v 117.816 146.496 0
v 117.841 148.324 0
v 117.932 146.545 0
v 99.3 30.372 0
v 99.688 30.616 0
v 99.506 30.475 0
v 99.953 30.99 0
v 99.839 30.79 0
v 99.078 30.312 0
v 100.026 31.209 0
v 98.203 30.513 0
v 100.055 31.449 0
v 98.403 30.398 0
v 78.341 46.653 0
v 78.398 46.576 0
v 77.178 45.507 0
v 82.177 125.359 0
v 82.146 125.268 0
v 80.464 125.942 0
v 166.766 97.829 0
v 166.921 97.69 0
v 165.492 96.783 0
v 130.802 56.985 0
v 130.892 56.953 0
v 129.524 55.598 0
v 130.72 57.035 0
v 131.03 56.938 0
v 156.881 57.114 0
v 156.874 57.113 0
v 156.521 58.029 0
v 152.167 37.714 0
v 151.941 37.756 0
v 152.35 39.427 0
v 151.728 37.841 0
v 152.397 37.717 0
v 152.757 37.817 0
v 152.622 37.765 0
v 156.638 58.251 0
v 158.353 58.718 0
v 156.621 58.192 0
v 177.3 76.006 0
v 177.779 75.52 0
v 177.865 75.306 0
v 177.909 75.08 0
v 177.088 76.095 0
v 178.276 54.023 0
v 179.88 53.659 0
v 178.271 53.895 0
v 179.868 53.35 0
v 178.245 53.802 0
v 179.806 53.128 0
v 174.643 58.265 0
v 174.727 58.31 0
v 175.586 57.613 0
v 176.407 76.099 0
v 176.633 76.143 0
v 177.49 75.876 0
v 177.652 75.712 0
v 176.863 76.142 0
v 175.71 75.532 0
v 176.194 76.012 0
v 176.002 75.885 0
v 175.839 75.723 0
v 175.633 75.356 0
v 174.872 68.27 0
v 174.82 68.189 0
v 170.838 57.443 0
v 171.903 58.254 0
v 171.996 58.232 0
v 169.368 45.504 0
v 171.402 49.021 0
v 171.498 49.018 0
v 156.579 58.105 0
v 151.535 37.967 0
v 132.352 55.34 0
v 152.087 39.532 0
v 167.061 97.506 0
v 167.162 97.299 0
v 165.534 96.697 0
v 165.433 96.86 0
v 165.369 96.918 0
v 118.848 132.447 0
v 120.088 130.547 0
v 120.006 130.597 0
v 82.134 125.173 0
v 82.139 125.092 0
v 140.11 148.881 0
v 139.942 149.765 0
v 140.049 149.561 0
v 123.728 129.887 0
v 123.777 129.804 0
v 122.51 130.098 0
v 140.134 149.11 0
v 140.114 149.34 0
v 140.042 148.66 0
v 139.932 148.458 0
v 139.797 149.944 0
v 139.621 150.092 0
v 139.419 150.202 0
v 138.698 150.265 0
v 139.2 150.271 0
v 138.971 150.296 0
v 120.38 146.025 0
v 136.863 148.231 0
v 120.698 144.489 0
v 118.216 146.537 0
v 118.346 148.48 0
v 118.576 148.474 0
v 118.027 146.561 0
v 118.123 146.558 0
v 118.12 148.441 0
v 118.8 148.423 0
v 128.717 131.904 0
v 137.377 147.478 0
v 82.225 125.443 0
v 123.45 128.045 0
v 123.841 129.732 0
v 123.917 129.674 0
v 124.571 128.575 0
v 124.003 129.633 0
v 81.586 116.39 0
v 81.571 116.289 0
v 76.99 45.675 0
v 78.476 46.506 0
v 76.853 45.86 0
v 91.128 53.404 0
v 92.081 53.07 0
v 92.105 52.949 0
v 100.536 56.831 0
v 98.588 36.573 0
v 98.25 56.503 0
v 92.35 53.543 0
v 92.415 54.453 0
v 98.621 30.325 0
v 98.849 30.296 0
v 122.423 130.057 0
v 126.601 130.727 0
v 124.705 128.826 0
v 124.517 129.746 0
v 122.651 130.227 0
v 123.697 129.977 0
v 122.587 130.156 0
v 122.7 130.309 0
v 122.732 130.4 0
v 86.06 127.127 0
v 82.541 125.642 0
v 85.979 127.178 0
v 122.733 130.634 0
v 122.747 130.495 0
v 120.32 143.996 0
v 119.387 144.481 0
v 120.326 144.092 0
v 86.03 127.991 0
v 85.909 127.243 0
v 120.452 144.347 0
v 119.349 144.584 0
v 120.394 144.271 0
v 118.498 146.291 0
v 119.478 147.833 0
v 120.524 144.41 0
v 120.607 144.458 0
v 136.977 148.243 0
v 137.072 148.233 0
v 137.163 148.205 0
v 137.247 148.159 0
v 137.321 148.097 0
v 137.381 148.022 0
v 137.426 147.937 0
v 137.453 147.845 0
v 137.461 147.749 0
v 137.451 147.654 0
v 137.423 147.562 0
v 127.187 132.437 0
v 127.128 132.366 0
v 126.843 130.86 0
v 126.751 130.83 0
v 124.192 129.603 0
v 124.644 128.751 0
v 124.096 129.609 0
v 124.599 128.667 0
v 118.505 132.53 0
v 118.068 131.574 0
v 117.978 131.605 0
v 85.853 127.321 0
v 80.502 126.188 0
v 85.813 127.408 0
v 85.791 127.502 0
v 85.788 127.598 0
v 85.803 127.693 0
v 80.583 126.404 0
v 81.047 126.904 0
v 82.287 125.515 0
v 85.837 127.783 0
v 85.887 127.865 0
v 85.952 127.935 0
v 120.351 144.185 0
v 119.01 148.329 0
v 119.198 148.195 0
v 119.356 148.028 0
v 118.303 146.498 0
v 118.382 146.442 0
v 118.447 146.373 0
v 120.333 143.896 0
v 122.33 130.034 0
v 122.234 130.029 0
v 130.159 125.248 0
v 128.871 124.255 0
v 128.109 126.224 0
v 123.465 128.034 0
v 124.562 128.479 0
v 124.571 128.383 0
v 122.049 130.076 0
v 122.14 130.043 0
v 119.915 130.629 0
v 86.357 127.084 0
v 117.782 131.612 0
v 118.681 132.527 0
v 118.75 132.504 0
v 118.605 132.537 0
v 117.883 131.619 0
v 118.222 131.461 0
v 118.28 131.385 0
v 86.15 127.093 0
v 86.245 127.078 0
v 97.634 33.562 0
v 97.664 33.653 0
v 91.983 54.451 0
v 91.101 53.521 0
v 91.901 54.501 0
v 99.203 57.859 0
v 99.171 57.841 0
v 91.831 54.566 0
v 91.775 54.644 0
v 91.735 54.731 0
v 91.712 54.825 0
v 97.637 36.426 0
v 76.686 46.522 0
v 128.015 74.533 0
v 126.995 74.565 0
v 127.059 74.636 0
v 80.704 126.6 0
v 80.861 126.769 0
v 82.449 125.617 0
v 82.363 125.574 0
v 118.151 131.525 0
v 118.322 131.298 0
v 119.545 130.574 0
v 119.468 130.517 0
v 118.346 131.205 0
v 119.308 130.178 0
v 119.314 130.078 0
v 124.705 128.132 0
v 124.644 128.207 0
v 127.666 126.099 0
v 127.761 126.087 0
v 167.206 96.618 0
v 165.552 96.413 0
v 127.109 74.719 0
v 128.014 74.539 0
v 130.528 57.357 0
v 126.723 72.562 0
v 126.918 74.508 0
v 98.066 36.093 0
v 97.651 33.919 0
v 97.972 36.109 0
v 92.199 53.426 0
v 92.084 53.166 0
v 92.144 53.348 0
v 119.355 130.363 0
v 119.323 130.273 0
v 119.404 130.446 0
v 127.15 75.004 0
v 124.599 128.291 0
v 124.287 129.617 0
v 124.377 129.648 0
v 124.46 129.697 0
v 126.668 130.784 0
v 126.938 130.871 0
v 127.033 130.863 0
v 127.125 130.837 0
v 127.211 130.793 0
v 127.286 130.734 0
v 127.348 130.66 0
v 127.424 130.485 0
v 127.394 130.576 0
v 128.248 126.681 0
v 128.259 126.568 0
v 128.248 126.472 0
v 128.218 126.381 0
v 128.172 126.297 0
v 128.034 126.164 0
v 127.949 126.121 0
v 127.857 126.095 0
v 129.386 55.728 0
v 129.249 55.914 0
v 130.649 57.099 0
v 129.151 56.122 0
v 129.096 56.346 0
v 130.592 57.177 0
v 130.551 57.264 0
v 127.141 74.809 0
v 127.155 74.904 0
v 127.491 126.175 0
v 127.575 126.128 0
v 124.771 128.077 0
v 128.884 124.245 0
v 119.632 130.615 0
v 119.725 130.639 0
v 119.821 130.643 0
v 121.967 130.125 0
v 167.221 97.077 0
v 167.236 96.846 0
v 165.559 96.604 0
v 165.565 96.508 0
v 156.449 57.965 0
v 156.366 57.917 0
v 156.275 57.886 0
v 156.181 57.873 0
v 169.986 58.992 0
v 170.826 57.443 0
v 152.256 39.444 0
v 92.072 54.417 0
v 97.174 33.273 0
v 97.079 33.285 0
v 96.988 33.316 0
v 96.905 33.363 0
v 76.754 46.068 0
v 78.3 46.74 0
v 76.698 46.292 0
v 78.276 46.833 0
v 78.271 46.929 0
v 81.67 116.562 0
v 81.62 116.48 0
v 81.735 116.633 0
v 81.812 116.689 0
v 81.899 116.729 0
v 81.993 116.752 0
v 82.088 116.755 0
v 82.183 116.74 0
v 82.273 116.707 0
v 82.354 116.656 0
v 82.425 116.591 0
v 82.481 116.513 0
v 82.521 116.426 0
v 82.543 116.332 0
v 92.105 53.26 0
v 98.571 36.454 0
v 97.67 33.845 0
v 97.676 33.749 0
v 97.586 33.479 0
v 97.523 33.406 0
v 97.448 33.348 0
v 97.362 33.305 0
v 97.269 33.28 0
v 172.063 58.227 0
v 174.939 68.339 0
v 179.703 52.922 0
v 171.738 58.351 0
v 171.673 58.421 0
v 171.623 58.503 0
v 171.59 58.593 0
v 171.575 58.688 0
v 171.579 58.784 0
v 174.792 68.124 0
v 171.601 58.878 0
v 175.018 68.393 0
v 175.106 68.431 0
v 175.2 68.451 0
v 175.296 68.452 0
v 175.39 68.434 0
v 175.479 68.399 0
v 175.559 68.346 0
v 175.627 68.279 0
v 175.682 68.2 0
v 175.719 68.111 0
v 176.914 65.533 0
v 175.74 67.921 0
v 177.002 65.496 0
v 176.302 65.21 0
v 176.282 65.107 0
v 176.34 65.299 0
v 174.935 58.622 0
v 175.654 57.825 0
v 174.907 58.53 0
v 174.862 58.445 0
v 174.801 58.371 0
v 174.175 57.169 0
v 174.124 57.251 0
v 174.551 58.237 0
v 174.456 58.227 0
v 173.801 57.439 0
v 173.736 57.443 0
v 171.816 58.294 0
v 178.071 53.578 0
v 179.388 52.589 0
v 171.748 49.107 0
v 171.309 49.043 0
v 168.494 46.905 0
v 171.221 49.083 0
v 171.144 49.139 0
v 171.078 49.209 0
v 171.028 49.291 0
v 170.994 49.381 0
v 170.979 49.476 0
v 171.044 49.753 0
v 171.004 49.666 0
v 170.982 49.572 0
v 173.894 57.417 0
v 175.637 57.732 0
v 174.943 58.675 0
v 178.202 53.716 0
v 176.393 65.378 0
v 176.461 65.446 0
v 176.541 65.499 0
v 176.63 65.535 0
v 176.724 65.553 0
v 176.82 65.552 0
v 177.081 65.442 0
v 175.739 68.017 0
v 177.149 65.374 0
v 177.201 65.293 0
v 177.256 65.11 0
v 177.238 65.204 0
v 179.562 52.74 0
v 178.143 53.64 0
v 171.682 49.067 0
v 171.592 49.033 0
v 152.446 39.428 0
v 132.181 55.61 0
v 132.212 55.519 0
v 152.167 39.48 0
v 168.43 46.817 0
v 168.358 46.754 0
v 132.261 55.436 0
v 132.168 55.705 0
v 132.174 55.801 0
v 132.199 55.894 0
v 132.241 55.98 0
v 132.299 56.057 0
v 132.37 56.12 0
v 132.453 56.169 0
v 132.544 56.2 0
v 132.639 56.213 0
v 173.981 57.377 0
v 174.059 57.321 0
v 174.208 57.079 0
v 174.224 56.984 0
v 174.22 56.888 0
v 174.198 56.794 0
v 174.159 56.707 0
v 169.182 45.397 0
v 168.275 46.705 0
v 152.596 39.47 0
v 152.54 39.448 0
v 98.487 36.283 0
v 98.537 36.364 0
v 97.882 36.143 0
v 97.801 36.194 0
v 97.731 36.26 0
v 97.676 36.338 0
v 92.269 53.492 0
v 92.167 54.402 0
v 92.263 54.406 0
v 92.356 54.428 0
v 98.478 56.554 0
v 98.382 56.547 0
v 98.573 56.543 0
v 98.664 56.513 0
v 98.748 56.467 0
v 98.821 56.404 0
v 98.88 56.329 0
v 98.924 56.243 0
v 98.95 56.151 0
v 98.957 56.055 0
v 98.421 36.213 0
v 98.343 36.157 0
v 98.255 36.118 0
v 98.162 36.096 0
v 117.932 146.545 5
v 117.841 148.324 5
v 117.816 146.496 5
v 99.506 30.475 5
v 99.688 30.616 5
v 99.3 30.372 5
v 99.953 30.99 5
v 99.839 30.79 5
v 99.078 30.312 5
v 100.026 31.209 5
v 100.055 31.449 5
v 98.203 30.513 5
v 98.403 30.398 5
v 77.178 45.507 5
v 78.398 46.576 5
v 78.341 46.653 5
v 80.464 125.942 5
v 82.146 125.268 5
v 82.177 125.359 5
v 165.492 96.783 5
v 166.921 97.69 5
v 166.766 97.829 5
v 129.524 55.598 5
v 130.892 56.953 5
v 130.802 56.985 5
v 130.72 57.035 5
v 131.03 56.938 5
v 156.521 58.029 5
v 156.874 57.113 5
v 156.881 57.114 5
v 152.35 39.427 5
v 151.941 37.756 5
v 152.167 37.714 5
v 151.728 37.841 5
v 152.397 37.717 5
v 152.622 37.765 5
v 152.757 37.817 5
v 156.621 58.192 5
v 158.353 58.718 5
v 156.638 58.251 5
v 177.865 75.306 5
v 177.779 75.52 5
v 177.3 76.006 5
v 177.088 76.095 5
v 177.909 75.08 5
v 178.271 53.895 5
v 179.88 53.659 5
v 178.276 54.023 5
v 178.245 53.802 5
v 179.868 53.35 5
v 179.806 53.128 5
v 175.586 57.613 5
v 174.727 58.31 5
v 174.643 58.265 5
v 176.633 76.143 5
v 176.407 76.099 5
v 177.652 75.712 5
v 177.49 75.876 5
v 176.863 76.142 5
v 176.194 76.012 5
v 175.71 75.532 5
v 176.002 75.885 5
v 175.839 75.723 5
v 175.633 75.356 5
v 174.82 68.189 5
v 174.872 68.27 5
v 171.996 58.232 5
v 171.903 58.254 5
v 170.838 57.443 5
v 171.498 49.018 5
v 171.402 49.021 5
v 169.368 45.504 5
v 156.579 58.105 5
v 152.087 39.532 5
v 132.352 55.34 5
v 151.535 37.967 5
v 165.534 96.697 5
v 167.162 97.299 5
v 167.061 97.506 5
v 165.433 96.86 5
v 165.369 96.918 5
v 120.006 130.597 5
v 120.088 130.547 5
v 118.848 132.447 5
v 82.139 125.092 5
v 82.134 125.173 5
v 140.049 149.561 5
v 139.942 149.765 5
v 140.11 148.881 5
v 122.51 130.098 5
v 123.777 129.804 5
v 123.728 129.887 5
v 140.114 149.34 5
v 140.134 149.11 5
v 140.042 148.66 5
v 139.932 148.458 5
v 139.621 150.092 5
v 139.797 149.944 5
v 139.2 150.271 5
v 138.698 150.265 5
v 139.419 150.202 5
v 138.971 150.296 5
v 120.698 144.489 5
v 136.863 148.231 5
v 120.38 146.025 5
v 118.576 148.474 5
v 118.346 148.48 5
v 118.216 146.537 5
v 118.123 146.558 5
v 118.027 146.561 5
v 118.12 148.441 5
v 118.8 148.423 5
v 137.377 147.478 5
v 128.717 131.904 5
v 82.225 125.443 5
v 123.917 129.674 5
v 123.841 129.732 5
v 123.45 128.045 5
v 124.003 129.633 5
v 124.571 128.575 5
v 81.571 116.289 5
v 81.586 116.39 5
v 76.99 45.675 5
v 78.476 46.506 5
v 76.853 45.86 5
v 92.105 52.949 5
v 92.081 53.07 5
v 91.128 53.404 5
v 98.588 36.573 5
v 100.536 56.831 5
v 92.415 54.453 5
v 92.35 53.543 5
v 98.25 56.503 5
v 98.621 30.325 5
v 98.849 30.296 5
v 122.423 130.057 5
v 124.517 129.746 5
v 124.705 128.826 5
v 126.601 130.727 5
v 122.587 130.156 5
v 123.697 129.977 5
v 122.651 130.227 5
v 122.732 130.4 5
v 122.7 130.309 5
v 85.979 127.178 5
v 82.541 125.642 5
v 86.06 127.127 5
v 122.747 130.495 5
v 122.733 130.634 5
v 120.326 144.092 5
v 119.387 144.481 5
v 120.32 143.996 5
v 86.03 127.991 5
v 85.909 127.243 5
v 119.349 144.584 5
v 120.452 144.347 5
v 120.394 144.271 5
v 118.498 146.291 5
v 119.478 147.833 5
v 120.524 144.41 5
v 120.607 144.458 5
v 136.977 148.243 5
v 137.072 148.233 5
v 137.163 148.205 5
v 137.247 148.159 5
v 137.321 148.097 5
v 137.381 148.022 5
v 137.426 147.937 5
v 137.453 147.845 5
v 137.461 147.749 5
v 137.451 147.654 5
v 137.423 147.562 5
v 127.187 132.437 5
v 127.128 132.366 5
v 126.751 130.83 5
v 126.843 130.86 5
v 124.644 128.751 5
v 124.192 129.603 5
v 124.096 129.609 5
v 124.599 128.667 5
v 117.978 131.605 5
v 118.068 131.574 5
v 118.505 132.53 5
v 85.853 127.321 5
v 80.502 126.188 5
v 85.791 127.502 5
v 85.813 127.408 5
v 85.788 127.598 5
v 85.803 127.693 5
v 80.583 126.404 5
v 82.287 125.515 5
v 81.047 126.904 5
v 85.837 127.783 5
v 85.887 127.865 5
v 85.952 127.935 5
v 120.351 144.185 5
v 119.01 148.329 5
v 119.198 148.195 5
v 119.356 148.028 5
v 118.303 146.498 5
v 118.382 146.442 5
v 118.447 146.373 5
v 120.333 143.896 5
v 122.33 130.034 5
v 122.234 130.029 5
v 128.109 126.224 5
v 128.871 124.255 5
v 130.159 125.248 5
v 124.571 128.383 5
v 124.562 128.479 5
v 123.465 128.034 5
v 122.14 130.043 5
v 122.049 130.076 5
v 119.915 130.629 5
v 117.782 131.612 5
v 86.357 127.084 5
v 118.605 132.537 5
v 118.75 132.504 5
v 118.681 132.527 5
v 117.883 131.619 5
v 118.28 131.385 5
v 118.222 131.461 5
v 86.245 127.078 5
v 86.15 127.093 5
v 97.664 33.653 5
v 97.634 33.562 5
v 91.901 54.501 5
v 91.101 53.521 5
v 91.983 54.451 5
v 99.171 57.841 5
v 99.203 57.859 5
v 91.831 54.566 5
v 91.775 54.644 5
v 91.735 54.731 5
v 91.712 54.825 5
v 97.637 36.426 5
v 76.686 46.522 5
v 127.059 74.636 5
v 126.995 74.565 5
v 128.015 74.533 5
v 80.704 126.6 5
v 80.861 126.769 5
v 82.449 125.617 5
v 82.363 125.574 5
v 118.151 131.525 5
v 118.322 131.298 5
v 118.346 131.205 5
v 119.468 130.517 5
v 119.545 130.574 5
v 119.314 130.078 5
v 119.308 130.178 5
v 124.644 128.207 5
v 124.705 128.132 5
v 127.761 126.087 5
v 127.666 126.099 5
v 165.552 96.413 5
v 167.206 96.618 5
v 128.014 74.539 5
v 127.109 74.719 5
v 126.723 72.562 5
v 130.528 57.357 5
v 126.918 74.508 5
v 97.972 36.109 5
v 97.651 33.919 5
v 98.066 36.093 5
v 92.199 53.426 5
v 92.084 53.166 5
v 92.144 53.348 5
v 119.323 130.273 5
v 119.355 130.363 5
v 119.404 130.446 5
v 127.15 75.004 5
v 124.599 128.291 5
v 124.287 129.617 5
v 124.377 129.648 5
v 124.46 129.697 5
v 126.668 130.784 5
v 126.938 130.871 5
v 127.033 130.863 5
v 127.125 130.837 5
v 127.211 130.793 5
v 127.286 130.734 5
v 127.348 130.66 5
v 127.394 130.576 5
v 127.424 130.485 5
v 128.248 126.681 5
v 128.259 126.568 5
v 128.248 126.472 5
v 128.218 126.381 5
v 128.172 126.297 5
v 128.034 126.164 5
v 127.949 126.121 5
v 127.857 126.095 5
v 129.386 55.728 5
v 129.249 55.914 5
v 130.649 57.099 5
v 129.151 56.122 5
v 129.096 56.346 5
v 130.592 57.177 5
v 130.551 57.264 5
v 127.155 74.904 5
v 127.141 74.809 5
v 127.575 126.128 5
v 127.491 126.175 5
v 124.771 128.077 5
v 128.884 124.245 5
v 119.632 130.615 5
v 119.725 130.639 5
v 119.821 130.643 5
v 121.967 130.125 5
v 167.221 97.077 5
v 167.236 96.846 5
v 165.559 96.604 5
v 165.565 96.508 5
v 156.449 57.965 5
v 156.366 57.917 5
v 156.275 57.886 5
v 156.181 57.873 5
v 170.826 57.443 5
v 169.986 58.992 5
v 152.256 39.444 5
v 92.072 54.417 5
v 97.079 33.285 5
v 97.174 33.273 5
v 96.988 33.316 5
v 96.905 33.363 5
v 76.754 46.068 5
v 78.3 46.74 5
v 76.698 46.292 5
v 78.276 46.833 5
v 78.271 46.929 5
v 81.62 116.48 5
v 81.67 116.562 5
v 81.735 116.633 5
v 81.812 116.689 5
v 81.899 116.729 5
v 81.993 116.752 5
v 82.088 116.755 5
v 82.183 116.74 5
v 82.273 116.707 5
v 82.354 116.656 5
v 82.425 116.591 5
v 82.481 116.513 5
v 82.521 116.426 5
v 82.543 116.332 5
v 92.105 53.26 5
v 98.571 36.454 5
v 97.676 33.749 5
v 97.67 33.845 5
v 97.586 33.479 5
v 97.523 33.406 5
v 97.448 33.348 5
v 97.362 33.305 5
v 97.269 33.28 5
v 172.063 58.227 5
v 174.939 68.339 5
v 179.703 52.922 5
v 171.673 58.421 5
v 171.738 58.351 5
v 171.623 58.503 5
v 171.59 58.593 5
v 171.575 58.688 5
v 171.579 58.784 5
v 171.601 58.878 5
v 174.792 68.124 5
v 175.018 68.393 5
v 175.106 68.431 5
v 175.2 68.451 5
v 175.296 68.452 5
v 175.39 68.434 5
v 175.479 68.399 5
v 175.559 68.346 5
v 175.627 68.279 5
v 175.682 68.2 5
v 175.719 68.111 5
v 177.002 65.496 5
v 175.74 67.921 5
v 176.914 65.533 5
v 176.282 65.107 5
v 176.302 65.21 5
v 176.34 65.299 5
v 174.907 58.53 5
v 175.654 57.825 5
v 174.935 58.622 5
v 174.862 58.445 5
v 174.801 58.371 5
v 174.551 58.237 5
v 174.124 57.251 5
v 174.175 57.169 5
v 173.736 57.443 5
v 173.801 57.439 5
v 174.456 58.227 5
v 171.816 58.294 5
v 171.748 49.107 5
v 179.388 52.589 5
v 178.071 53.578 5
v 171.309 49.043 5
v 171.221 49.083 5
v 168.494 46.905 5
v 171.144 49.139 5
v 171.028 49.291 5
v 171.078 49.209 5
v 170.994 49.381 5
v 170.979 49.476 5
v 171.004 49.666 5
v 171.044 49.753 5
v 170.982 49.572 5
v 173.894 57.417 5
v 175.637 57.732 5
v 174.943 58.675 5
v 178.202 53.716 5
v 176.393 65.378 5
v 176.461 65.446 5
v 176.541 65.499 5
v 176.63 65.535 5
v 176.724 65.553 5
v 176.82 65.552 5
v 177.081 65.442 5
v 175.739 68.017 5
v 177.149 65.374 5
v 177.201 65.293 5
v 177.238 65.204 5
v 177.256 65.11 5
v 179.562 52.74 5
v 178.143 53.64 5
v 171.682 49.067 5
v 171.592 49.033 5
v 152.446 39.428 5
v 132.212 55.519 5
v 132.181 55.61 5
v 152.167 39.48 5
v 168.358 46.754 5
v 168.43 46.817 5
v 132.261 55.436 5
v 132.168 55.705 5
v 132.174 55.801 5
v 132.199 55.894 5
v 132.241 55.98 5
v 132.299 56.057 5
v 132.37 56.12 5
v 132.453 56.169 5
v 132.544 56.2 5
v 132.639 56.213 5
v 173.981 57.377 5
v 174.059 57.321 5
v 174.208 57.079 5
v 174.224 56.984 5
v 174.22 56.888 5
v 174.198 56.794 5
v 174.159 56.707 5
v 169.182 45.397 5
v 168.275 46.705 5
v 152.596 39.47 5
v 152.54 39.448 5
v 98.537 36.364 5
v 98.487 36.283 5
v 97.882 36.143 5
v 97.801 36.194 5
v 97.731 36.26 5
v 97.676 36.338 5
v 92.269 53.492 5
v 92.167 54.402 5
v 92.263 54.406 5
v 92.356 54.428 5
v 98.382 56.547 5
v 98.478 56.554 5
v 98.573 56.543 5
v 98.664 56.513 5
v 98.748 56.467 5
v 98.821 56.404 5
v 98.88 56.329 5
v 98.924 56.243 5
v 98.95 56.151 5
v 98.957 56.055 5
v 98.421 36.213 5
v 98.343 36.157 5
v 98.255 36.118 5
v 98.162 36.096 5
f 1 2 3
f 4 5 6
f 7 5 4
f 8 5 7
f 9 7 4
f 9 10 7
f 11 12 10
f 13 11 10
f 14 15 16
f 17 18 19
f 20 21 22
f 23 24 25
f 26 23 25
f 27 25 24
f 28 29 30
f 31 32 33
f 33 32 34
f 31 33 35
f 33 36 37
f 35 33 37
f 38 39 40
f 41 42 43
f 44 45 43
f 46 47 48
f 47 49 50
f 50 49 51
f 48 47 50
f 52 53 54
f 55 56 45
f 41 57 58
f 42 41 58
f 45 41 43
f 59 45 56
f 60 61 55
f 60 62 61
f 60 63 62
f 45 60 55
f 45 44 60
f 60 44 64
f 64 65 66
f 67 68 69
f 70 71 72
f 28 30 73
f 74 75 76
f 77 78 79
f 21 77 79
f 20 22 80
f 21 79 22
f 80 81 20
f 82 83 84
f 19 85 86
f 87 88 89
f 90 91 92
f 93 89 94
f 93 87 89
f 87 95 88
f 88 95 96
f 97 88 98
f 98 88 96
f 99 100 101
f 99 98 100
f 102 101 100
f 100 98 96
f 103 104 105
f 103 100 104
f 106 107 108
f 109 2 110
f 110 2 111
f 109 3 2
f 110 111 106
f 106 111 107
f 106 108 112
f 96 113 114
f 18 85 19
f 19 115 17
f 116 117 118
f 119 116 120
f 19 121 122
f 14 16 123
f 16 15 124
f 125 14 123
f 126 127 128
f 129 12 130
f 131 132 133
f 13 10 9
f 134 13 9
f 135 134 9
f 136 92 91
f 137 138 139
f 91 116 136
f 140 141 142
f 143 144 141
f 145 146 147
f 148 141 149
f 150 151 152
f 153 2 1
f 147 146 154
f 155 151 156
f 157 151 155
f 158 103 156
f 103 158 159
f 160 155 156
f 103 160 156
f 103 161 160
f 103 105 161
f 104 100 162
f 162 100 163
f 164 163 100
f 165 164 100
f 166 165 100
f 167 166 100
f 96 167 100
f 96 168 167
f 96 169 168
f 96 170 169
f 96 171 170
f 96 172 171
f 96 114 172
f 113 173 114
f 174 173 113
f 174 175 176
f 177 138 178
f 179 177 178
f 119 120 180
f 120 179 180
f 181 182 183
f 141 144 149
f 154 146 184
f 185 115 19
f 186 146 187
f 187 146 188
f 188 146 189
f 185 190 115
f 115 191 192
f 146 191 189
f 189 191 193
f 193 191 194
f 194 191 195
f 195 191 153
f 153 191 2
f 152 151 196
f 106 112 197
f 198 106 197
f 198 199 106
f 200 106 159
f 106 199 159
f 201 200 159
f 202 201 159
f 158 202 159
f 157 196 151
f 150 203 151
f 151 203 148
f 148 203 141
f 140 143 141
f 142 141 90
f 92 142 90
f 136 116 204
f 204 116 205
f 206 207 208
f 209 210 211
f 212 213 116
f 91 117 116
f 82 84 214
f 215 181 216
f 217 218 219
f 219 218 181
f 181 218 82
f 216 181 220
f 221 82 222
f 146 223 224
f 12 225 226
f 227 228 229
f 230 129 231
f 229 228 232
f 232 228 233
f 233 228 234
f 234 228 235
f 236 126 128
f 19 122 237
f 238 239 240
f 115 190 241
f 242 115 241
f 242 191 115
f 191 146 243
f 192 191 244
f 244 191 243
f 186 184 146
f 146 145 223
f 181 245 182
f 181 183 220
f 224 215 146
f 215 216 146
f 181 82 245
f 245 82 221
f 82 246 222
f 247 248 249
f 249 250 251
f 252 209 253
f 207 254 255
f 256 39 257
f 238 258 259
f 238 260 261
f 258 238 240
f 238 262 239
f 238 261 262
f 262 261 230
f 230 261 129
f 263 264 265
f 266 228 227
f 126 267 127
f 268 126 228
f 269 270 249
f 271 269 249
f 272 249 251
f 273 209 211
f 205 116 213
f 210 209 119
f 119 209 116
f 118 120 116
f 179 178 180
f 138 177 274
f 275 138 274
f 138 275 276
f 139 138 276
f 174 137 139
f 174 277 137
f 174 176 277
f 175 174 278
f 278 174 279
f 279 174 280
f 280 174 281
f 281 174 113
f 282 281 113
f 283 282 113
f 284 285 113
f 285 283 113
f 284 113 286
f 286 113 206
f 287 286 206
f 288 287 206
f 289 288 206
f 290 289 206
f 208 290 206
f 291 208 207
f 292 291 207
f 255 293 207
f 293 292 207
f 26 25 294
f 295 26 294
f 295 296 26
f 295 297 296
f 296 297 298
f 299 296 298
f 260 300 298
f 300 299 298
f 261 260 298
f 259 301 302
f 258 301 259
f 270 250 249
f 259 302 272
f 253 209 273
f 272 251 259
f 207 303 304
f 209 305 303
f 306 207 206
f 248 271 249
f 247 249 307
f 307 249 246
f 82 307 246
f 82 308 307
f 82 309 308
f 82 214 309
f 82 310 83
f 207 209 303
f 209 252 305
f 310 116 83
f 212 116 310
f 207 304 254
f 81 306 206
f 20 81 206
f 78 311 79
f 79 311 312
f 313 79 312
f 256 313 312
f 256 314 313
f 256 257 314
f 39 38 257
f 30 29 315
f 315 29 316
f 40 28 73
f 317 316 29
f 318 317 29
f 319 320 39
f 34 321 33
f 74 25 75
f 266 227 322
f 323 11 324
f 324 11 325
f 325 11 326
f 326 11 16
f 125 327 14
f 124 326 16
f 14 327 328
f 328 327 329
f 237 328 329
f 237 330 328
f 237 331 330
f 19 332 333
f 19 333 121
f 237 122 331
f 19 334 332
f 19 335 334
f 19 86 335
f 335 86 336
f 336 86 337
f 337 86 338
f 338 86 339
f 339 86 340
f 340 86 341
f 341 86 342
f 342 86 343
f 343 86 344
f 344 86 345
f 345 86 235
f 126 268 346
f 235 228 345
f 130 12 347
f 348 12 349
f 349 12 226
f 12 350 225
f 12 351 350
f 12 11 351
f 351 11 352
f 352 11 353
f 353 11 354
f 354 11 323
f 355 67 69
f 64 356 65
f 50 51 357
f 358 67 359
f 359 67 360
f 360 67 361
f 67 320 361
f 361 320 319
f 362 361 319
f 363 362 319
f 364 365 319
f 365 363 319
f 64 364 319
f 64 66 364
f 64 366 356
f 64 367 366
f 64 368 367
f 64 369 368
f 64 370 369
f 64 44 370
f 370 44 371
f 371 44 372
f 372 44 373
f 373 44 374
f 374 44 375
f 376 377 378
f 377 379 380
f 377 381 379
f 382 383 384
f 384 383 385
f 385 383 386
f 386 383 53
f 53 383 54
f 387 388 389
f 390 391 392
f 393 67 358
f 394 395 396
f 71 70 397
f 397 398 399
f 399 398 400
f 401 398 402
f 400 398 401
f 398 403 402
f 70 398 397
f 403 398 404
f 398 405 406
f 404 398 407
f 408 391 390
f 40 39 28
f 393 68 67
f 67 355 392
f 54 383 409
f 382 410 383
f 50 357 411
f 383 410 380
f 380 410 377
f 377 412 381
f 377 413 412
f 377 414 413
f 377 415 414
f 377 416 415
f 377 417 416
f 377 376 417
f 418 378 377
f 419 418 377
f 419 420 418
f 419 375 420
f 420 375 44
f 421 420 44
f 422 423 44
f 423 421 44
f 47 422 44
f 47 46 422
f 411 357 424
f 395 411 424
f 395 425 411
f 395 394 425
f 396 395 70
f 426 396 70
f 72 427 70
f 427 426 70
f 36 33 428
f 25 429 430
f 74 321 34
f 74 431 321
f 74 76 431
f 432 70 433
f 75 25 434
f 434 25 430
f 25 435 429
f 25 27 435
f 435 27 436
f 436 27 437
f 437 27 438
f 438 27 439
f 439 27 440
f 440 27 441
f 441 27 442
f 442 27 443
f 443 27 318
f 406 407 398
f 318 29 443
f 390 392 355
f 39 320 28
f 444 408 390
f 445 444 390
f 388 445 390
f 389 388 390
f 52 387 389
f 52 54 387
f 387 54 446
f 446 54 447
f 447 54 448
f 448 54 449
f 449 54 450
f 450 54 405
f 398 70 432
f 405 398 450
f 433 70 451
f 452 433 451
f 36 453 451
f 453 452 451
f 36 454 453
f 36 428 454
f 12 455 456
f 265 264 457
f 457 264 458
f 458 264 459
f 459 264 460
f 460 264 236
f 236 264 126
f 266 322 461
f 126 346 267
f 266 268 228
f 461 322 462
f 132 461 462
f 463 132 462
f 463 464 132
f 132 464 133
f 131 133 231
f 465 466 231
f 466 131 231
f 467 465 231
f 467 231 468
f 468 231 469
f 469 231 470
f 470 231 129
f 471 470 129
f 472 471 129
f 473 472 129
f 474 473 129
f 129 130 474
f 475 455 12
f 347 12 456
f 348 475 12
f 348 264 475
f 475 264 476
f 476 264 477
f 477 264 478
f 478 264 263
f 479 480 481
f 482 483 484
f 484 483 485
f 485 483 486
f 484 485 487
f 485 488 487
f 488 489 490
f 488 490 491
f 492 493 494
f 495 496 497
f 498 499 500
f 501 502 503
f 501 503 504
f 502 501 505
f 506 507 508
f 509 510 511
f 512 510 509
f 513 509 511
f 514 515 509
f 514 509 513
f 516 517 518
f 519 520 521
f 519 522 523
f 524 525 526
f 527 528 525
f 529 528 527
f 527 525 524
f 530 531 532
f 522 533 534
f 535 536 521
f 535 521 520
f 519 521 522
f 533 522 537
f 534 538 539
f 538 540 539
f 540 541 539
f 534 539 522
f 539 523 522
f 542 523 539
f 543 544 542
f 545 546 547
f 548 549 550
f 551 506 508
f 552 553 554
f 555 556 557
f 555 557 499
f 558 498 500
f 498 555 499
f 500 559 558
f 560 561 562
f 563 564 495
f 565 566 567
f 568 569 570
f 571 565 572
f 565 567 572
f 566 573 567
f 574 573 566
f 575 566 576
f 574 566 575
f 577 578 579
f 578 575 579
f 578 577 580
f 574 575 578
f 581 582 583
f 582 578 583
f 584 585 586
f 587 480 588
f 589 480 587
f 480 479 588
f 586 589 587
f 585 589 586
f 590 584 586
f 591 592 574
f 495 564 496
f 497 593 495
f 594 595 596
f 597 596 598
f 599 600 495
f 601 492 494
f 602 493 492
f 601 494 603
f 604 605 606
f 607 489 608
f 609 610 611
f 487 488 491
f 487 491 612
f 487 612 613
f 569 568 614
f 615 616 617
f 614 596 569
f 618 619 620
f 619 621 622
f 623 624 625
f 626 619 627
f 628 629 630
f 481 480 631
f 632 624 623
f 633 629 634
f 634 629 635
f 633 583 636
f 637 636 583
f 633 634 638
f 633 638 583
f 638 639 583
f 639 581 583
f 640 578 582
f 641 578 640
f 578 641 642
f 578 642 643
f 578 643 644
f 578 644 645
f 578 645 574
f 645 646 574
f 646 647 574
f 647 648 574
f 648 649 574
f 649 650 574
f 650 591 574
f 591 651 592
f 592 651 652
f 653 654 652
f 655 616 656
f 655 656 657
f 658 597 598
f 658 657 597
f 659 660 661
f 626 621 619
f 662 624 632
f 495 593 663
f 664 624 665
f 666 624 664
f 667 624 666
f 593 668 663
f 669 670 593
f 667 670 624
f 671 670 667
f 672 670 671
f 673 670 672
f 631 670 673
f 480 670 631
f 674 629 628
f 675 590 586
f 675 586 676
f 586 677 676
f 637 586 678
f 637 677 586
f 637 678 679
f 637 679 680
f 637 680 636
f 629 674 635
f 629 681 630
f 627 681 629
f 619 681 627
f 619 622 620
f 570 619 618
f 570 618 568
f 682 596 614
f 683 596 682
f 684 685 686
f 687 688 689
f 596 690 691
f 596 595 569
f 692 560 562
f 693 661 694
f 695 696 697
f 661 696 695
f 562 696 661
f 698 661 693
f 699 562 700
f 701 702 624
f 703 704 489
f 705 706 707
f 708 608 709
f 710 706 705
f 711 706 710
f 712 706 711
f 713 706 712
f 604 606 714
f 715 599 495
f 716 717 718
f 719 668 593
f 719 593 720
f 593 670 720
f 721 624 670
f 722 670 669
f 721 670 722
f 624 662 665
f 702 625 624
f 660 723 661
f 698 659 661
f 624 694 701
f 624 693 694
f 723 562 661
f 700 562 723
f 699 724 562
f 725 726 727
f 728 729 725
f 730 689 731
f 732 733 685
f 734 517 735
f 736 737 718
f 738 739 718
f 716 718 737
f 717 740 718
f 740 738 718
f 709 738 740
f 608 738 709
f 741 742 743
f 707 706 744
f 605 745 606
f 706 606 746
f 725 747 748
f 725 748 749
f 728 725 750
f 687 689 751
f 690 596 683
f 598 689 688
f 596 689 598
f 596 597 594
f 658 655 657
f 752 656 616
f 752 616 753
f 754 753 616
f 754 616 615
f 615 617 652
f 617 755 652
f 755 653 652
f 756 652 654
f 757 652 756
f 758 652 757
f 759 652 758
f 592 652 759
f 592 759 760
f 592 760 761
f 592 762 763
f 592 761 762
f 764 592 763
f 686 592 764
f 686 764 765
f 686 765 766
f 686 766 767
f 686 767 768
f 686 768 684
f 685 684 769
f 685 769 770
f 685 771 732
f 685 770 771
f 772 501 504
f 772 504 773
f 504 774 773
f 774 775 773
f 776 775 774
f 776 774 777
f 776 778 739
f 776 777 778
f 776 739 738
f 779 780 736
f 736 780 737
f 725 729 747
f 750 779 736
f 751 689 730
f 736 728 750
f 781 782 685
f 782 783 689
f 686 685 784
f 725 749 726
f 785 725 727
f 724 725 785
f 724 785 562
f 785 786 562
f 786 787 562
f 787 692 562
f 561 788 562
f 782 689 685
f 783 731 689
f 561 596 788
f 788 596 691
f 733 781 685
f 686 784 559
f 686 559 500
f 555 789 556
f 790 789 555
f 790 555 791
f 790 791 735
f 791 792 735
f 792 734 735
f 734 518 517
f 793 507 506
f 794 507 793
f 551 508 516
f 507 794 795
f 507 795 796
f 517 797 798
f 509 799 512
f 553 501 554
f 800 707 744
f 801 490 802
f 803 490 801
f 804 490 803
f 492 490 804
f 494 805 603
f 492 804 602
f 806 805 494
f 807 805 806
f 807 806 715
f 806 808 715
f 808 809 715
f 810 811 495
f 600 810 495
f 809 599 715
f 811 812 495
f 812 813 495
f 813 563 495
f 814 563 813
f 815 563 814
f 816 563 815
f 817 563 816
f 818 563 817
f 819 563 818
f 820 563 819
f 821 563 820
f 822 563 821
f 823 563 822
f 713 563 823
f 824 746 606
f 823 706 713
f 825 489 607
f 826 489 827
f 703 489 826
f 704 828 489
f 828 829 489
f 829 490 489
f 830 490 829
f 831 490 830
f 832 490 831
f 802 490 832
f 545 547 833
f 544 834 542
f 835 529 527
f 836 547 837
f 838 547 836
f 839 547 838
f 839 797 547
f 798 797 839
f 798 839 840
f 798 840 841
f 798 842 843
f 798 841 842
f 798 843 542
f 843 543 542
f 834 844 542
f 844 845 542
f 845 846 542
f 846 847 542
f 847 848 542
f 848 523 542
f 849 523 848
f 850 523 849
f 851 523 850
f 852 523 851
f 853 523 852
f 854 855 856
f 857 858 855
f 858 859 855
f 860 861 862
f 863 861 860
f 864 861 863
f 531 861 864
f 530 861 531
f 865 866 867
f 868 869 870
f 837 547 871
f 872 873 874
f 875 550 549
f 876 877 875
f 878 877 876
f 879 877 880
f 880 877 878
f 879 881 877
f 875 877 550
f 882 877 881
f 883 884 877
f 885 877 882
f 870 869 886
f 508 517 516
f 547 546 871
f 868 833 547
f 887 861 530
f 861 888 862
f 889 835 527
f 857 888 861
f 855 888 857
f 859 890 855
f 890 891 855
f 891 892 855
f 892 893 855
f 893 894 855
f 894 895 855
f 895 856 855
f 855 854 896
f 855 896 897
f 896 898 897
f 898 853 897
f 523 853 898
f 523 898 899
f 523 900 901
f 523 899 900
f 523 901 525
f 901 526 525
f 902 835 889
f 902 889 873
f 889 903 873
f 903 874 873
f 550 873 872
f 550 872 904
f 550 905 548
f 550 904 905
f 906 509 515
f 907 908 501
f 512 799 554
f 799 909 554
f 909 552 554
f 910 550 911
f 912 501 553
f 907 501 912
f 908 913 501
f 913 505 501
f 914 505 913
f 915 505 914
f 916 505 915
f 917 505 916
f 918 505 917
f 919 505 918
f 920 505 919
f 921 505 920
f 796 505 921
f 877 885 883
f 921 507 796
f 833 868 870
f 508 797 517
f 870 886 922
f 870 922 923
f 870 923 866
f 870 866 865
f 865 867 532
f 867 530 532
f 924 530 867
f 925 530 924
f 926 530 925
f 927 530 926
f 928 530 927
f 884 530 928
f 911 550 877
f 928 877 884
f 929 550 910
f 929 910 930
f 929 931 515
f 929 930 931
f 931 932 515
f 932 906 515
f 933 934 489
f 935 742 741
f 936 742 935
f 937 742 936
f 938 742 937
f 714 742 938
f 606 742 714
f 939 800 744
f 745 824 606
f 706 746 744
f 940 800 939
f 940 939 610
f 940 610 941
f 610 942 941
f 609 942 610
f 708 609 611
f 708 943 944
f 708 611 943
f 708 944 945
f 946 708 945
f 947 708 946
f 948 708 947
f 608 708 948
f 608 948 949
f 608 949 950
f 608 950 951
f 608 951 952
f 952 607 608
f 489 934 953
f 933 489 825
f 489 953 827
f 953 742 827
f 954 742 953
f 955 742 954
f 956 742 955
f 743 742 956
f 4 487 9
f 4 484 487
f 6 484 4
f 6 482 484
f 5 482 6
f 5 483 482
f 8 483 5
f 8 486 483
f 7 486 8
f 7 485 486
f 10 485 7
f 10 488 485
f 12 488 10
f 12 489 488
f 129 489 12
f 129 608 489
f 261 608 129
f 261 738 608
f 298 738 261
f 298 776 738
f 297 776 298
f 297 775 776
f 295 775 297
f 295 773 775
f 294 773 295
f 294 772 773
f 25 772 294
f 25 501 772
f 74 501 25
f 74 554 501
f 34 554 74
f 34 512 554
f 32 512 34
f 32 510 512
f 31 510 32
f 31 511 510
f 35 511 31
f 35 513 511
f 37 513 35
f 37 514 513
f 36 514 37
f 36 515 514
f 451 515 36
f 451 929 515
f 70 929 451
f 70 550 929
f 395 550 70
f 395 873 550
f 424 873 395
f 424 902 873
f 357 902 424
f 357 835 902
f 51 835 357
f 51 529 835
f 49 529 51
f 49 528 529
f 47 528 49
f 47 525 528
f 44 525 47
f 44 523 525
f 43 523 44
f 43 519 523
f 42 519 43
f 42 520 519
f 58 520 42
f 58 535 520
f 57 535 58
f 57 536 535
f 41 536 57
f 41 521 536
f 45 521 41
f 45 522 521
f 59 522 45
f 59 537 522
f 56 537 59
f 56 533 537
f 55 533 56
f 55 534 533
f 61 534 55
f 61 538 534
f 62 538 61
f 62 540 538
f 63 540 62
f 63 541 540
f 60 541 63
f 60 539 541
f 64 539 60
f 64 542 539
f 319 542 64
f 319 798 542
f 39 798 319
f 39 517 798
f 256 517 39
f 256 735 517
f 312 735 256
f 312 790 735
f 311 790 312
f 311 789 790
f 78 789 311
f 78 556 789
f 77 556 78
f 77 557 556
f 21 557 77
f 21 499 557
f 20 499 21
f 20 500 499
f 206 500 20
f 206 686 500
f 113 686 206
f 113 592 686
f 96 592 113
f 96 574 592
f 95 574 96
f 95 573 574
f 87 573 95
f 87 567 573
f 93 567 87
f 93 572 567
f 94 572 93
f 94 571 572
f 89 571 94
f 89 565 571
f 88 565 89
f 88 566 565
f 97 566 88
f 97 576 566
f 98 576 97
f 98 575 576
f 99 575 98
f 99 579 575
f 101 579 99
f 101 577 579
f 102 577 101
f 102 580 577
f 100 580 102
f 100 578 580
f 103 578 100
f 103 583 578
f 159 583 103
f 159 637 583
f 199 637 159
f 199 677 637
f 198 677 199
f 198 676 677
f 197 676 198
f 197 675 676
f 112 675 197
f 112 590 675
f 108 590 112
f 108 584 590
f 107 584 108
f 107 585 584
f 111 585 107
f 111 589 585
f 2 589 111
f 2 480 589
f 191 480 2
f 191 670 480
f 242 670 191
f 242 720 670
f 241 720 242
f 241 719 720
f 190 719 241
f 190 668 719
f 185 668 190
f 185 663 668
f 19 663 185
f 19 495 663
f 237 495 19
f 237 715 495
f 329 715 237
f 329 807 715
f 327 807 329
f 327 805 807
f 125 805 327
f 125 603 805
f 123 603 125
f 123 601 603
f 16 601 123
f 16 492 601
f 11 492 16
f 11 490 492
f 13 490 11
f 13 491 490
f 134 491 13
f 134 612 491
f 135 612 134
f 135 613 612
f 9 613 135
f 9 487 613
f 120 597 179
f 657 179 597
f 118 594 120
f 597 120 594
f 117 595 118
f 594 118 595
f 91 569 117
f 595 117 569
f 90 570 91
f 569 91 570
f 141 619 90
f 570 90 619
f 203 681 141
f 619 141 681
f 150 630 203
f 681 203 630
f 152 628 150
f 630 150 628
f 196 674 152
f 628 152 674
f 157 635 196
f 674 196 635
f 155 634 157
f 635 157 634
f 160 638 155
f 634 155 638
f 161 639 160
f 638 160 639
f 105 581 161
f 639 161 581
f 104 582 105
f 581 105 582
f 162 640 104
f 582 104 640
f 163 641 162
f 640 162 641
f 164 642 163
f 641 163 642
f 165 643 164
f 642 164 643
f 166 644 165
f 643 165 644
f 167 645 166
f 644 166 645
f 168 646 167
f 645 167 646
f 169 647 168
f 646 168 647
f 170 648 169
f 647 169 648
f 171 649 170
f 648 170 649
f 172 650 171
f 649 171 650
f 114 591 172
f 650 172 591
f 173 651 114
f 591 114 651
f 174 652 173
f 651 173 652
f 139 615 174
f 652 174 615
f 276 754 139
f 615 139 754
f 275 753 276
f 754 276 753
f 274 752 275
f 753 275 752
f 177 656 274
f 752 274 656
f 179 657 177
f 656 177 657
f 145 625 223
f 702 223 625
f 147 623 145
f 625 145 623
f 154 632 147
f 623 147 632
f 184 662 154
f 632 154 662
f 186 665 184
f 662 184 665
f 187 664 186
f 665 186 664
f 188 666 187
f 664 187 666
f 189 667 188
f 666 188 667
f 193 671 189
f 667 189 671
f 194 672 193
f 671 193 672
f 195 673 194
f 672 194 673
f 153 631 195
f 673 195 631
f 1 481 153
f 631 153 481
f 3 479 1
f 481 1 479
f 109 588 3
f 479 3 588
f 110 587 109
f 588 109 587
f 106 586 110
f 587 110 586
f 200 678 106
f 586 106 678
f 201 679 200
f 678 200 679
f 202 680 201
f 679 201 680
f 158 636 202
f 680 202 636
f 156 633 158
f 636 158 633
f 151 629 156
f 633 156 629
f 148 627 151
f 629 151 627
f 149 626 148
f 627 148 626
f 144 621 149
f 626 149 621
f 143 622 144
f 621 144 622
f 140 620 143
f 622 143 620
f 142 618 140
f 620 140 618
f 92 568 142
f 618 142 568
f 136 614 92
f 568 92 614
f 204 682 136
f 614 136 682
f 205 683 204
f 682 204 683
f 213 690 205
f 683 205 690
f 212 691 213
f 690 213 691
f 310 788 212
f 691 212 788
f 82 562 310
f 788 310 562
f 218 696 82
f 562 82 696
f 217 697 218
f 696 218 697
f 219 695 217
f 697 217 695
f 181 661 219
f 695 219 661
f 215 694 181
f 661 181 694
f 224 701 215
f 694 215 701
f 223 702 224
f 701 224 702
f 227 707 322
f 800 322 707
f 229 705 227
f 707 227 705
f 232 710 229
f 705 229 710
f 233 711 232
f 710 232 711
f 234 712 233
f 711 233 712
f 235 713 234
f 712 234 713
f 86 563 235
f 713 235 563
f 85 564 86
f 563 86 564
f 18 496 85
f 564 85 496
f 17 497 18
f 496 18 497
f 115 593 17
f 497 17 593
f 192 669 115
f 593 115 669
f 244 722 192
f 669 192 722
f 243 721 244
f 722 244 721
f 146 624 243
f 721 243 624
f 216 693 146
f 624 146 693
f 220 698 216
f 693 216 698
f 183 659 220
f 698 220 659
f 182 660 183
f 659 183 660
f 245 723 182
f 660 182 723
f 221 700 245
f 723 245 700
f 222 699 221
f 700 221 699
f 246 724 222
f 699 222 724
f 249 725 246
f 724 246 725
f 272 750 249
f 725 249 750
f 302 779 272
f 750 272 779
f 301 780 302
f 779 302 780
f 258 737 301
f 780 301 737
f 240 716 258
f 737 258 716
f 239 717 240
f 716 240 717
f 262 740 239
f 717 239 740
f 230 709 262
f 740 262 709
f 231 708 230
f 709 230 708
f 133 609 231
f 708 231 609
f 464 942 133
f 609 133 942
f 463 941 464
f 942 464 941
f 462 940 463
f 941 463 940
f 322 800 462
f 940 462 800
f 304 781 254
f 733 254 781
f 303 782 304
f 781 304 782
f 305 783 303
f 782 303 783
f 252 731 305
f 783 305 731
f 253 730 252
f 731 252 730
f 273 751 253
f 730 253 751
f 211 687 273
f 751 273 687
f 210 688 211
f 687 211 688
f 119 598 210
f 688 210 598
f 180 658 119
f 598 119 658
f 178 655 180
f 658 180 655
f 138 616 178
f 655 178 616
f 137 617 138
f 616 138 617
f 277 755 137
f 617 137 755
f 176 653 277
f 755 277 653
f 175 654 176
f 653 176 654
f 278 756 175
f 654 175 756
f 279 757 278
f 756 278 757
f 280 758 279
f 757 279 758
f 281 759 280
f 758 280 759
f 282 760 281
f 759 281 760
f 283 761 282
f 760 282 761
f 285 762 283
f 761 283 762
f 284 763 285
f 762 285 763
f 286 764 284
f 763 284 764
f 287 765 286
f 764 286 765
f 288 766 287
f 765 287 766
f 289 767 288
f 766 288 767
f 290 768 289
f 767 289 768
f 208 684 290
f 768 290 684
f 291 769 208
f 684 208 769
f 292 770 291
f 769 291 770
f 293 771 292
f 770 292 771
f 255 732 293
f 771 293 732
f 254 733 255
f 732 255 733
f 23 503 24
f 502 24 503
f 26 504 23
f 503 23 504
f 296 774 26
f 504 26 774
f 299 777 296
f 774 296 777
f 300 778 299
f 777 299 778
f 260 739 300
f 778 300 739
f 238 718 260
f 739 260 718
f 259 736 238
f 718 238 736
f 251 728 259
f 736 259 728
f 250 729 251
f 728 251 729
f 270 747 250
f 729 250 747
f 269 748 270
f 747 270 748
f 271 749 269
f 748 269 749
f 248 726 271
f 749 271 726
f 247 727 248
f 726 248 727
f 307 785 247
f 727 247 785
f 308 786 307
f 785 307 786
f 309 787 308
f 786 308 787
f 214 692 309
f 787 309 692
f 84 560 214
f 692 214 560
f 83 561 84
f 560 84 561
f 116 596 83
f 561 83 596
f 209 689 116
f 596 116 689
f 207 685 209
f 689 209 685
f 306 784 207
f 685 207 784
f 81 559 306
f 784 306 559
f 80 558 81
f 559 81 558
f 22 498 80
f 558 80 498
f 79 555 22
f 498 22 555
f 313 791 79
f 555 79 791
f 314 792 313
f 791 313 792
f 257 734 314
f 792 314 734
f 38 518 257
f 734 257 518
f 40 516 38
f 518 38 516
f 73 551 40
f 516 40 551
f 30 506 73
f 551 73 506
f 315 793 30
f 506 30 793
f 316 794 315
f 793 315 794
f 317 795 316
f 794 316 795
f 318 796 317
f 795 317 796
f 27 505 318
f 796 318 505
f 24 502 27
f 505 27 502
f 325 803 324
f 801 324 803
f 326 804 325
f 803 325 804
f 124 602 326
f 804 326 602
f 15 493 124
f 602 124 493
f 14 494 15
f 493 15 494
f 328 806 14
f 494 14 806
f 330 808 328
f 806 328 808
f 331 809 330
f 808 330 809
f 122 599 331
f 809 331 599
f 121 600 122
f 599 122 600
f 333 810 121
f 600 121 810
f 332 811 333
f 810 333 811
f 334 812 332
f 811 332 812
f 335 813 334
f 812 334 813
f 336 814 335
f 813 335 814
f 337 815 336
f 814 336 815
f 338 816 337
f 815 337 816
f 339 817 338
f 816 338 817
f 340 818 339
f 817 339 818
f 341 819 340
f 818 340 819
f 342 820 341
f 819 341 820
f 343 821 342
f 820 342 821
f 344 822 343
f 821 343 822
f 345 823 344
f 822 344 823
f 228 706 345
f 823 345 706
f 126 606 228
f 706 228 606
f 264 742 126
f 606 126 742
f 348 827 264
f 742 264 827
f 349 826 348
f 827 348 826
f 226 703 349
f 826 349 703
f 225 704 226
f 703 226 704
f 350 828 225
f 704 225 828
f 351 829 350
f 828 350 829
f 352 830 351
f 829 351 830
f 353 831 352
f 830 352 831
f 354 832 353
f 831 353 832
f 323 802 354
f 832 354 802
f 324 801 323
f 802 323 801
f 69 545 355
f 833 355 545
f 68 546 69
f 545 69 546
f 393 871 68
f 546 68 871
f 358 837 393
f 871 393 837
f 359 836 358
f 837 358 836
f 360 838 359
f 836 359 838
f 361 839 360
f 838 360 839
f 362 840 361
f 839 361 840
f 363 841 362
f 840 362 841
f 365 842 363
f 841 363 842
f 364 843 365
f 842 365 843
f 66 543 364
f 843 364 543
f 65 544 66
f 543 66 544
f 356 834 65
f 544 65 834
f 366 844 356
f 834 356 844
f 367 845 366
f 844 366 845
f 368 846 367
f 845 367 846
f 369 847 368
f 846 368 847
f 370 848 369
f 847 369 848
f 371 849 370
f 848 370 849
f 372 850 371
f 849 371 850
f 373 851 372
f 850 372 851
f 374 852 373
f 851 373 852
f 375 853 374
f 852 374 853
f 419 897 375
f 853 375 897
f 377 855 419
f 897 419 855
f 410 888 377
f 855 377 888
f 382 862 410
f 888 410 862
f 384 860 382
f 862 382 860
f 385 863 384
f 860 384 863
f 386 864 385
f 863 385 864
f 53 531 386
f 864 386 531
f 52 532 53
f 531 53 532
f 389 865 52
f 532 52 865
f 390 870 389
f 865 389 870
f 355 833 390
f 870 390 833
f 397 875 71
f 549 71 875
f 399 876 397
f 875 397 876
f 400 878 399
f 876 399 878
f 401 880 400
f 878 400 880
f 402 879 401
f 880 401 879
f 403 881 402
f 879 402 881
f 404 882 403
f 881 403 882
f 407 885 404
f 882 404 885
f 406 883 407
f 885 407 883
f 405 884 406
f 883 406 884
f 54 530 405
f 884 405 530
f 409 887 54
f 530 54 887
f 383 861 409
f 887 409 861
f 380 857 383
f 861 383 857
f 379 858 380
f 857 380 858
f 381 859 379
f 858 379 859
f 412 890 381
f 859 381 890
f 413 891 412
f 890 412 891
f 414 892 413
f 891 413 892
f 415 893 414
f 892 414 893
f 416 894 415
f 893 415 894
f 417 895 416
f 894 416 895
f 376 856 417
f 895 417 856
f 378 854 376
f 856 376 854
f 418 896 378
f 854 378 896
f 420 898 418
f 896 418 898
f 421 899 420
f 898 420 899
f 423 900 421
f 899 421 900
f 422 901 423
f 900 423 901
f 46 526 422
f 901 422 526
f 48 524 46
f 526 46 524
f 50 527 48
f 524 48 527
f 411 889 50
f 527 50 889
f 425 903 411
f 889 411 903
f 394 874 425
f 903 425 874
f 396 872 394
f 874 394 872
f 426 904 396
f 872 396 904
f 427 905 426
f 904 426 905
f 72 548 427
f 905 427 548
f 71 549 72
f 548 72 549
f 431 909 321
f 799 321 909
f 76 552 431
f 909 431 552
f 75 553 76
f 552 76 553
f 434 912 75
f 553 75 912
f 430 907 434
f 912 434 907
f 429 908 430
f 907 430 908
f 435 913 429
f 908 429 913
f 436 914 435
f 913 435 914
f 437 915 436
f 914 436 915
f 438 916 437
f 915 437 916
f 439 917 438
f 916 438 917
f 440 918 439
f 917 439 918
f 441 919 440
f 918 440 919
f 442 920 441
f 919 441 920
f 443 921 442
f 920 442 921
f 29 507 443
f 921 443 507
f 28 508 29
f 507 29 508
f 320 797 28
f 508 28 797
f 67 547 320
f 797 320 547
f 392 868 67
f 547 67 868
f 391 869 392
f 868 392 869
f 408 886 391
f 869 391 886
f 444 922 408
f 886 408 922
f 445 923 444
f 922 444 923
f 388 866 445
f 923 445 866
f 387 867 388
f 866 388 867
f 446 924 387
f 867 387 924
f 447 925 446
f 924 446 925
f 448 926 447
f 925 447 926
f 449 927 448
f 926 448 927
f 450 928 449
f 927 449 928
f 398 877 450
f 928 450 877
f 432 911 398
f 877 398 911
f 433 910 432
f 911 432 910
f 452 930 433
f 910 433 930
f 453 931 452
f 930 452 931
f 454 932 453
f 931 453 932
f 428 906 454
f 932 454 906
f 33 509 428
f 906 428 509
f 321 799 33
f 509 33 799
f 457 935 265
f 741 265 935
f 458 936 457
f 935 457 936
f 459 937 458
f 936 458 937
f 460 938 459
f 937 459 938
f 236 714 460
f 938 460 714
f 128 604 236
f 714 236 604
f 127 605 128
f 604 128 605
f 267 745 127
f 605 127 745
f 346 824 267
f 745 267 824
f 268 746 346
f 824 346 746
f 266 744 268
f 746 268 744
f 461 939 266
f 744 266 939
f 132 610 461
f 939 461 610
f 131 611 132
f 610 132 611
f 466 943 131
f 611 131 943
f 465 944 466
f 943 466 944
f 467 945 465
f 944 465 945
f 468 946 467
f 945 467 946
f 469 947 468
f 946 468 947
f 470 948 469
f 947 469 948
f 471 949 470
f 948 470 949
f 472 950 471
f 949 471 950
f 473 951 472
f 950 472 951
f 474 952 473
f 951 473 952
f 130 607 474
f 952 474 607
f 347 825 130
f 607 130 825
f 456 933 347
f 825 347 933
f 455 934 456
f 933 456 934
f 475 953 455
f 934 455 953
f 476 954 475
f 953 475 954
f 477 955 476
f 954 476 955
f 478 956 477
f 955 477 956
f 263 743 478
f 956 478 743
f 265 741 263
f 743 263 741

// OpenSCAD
/*
 * Customizable Origami - Turkey - https://www.thingiverse.com/thing:2741043
 * by Dennis Hofmann - https://www.thingiverse.com/mightynozzle/about
 * created 2018-01-01
 * version v1.0
 *
 * Changelog
 * --------------
 * v1.0:
 *      - final design
 * --------------
 * 
 * This work is licensed under the Creative Commons - Attribution - NonCommercial - ShareAlike license.
 * https://creativecommons.org/licenses/by-nc-sa/3.0/
 */


 // Parameter Section //
//-------------------//

// preview[view:north, tilt:top]

// The maximum size of the longest side. The shorter side will be automatically resized in same ratio.
max_size_in_millimeter = 120; //[20:300]

// The height of the model.
model_height_in_millimeter = 5; //[0.2:0.2:100]

// Thickness of the outer outline.
outline_size_in_millimeter = 1.6; //[0.5:0.1:20]

// Thickness of the inner outline.
inline_size_in_millimeter = 0.8; //[0.5:0.1:20]

// Roundiness of the ends of the inner outlines.
inline_edge_radius_in_millimeter = 0.5; //[0.0:0.1:5]

// Flip model
flip_model = "no"; //[yes,no]

/*[hidden]*/
max_size = max_size_in_millimeter;
model_height = model_height_in_millimeter;
$fn=32;

// Outer Points
A1 = [474, 282];
A2 = [602, 191];
A3 = [605, 349];
A4 = [777, 452];
A5 = [793, 343];
A6 = [927, 236];
A7 = [1027, 282];
A8 = [1088, 325];
A9 = [1076, 455];
A10 = [1040, 351];
A11 = [955, 349];
A12 = [1011, 588];
A13 = [786, 756];
A14 = [776, 802];
A15 = [846, 905];
A16 = [729, 878];
A17 = [721, 894];
A18 = [497, 764];

outline = [A1, A2, A3, A4, A5, A6, A7, A8, A9, A10, A11, A12, A13, A14, A15, A16, A17, A18];

// Inner Points
B1 = [557, 325];
B2 = [1067, 351];
B3 = [722, 802];
B4 = [753, 779];

// Polygons
C1 = [A2, B1, A18, A1];
C2 = [A2, A3, B1];
C3 = [B1, A18, B3, A4, A3];
C4 = [A18, A17, A16, B4, B3];
C5 = [A16, A15, A14, B4];
C6 = [B4, A14, A13];
C7 = [B3, A4, A5, A11, A12, A13, B4];
C8 = [A5, A6, A7, B2, A10, A11];
C9 = [A10, A9, B2];
C10 = [A7, A8, A9, B2];

cut_polygons = [C1, C2, C3, C4, C5, C6, C7, C8, C9, C10];

min_x = A1[0];
min_y = A2[1];
max_x = A8[0];
max_y = A15[1];

x_size = max_x - min_x;
y_size = max_y - min_y;

x_factor = max_size / x_size;
y_factor = max_size / y_size;

inline_size = x_size > y_size ? inline_size_in_millimeter / x_factor / 2: inline_size_in_millimeter / y_factor / 2;
inline_edge_radius = x_size > y_size ? inline_edge_radius_in_millimeter / x_factor: inline_edge_radius_in_millimeter / y_factor;
outline_size = x_size > y_size ? outline_size_in_millimeter / x_factor - inline_size: outline_size_in_millimeter / y_factor - inline_size;


 // Program Section //
//-----------------//

if(x_size > y_size) {
    resize(newsize=[max_size, x_factor * y_size, model_height]){
        if(flip_model == "yes") {
            mirror([0,1,0]) {
                rotate([180,180,0]) {    
                    create(outline, cut_polygons);
                }
            }
        } else {
            create(outline, cut_polygons);
        }
    }
} else {
    resize(newsize=[y_factor * x_size, max_size, model_height]){
        if(flip_model == "yes") {
            mirror([0,1,0]) {
                rotate([180,180,0]) {    
                    create(outline, cut_polygons);
                }
            }
        } else {
            create(outline, cut_polygons);
        }
    }
}


 // Module Section //
//----------------//

module create() {
    linear_extrude(height=1) {
        difference() {
            offset(r = -0) {
                offset(r = +outline_size) {
                    polygon(points = outline, convexity = 10);
                }
            }
            
            for(cut_polygon = [0:len(cut_polygons)]) {
                offset(r = +inline_edge_radius) {
                    offset(r = -inline_size - inline_edge_radius) {
                        polygon(points = cut_polygons[cut_polygon], convexity = 10);
                    }
                }
            }
        }
    }
}
